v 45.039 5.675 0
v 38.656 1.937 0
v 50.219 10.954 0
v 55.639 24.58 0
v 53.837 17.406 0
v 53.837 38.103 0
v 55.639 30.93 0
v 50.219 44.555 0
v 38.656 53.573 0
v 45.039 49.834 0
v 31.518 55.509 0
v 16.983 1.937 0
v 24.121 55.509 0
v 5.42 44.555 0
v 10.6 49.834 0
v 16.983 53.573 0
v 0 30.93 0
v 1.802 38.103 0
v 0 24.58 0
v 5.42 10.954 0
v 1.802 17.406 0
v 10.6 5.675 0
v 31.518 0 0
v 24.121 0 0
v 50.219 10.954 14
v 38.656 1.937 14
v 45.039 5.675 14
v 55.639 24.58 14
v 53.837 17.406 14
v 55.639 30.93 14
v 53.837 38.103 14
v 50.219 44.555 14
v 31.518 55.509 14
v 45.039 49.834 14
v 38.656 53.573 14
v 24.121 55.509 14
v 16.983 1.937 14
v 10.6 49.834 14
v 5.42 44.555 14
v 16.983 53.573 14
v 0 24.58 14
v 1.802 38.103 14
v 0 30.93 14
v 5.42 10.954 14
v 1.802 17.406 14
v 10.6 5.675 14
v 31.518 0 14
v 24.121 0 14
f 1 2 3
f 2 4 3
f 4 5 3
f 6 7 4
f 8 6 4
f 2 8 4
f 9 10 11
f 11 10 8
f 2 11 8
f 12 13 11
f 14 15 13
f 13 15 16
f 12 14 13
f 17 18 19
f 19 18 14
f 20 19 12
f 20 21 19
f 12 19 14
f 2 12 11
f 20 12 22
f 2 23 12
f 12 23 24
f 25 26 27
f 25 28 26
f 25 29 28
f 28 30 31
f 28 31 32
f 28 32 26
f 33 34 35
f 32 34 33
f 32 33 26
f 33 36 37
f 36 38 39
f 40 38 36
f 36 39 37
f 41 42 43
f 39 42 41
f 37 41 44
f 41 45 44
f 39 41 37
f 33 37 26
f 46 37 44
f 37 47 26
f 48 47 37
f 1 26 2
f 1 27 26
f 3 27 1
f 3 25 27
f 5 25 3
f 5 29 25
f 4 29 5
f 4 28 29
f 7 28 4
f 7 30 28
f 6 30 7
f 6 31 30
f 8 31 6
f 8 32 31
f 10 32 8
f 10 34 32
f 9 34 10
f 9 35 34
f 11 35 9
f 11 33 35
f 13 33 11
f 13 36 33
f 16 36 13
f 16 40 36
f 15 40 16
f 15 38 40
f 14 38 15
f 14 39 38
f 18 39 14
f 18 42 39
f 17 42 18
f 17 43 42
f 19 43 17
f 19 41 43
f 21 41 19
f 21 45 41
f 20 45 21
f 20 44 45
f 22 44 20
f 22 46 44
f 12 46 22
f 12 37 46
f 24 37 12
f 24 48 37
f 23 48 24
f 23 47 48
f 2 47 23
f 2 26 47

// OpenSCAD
$fn = 32;

// ----------------------------------------------------------------------
// Flat adaptor: double_d, 14 mm thick
// ----------------------------------------------------------------------

// --- parameters (mm) ---
profile_height = 14;      // extrusion height
profile_points = 24;      // points of the closed outline

profile = [[55.639, 30.93], [53.837, 38.103], [50.219, 44.555], [45.039, 49.834], [38.656, 53.573], [31.518, 55.509], [24.121, 55.509], [16.983, 53.573], [10.6, 49.834], [5.42, 44.555], [1.802, 38.103], [0, 30.93], [0, 24.58], [1.802, 17.406], [5.42, 10.954], [10.6, 5.675], [16.983, 1.937], [24.121, 0], [31.518, 0], [38.656, 1.937], [45.039, 5.675], [50.219, 10.954], [53.837, 17.406], [55.639, 24.58]];  // single closed polygon, 24 points, counter clockwise

// --- the one profile operation ---
linear_extrude(height = profile_height) polygon(points = profile);
